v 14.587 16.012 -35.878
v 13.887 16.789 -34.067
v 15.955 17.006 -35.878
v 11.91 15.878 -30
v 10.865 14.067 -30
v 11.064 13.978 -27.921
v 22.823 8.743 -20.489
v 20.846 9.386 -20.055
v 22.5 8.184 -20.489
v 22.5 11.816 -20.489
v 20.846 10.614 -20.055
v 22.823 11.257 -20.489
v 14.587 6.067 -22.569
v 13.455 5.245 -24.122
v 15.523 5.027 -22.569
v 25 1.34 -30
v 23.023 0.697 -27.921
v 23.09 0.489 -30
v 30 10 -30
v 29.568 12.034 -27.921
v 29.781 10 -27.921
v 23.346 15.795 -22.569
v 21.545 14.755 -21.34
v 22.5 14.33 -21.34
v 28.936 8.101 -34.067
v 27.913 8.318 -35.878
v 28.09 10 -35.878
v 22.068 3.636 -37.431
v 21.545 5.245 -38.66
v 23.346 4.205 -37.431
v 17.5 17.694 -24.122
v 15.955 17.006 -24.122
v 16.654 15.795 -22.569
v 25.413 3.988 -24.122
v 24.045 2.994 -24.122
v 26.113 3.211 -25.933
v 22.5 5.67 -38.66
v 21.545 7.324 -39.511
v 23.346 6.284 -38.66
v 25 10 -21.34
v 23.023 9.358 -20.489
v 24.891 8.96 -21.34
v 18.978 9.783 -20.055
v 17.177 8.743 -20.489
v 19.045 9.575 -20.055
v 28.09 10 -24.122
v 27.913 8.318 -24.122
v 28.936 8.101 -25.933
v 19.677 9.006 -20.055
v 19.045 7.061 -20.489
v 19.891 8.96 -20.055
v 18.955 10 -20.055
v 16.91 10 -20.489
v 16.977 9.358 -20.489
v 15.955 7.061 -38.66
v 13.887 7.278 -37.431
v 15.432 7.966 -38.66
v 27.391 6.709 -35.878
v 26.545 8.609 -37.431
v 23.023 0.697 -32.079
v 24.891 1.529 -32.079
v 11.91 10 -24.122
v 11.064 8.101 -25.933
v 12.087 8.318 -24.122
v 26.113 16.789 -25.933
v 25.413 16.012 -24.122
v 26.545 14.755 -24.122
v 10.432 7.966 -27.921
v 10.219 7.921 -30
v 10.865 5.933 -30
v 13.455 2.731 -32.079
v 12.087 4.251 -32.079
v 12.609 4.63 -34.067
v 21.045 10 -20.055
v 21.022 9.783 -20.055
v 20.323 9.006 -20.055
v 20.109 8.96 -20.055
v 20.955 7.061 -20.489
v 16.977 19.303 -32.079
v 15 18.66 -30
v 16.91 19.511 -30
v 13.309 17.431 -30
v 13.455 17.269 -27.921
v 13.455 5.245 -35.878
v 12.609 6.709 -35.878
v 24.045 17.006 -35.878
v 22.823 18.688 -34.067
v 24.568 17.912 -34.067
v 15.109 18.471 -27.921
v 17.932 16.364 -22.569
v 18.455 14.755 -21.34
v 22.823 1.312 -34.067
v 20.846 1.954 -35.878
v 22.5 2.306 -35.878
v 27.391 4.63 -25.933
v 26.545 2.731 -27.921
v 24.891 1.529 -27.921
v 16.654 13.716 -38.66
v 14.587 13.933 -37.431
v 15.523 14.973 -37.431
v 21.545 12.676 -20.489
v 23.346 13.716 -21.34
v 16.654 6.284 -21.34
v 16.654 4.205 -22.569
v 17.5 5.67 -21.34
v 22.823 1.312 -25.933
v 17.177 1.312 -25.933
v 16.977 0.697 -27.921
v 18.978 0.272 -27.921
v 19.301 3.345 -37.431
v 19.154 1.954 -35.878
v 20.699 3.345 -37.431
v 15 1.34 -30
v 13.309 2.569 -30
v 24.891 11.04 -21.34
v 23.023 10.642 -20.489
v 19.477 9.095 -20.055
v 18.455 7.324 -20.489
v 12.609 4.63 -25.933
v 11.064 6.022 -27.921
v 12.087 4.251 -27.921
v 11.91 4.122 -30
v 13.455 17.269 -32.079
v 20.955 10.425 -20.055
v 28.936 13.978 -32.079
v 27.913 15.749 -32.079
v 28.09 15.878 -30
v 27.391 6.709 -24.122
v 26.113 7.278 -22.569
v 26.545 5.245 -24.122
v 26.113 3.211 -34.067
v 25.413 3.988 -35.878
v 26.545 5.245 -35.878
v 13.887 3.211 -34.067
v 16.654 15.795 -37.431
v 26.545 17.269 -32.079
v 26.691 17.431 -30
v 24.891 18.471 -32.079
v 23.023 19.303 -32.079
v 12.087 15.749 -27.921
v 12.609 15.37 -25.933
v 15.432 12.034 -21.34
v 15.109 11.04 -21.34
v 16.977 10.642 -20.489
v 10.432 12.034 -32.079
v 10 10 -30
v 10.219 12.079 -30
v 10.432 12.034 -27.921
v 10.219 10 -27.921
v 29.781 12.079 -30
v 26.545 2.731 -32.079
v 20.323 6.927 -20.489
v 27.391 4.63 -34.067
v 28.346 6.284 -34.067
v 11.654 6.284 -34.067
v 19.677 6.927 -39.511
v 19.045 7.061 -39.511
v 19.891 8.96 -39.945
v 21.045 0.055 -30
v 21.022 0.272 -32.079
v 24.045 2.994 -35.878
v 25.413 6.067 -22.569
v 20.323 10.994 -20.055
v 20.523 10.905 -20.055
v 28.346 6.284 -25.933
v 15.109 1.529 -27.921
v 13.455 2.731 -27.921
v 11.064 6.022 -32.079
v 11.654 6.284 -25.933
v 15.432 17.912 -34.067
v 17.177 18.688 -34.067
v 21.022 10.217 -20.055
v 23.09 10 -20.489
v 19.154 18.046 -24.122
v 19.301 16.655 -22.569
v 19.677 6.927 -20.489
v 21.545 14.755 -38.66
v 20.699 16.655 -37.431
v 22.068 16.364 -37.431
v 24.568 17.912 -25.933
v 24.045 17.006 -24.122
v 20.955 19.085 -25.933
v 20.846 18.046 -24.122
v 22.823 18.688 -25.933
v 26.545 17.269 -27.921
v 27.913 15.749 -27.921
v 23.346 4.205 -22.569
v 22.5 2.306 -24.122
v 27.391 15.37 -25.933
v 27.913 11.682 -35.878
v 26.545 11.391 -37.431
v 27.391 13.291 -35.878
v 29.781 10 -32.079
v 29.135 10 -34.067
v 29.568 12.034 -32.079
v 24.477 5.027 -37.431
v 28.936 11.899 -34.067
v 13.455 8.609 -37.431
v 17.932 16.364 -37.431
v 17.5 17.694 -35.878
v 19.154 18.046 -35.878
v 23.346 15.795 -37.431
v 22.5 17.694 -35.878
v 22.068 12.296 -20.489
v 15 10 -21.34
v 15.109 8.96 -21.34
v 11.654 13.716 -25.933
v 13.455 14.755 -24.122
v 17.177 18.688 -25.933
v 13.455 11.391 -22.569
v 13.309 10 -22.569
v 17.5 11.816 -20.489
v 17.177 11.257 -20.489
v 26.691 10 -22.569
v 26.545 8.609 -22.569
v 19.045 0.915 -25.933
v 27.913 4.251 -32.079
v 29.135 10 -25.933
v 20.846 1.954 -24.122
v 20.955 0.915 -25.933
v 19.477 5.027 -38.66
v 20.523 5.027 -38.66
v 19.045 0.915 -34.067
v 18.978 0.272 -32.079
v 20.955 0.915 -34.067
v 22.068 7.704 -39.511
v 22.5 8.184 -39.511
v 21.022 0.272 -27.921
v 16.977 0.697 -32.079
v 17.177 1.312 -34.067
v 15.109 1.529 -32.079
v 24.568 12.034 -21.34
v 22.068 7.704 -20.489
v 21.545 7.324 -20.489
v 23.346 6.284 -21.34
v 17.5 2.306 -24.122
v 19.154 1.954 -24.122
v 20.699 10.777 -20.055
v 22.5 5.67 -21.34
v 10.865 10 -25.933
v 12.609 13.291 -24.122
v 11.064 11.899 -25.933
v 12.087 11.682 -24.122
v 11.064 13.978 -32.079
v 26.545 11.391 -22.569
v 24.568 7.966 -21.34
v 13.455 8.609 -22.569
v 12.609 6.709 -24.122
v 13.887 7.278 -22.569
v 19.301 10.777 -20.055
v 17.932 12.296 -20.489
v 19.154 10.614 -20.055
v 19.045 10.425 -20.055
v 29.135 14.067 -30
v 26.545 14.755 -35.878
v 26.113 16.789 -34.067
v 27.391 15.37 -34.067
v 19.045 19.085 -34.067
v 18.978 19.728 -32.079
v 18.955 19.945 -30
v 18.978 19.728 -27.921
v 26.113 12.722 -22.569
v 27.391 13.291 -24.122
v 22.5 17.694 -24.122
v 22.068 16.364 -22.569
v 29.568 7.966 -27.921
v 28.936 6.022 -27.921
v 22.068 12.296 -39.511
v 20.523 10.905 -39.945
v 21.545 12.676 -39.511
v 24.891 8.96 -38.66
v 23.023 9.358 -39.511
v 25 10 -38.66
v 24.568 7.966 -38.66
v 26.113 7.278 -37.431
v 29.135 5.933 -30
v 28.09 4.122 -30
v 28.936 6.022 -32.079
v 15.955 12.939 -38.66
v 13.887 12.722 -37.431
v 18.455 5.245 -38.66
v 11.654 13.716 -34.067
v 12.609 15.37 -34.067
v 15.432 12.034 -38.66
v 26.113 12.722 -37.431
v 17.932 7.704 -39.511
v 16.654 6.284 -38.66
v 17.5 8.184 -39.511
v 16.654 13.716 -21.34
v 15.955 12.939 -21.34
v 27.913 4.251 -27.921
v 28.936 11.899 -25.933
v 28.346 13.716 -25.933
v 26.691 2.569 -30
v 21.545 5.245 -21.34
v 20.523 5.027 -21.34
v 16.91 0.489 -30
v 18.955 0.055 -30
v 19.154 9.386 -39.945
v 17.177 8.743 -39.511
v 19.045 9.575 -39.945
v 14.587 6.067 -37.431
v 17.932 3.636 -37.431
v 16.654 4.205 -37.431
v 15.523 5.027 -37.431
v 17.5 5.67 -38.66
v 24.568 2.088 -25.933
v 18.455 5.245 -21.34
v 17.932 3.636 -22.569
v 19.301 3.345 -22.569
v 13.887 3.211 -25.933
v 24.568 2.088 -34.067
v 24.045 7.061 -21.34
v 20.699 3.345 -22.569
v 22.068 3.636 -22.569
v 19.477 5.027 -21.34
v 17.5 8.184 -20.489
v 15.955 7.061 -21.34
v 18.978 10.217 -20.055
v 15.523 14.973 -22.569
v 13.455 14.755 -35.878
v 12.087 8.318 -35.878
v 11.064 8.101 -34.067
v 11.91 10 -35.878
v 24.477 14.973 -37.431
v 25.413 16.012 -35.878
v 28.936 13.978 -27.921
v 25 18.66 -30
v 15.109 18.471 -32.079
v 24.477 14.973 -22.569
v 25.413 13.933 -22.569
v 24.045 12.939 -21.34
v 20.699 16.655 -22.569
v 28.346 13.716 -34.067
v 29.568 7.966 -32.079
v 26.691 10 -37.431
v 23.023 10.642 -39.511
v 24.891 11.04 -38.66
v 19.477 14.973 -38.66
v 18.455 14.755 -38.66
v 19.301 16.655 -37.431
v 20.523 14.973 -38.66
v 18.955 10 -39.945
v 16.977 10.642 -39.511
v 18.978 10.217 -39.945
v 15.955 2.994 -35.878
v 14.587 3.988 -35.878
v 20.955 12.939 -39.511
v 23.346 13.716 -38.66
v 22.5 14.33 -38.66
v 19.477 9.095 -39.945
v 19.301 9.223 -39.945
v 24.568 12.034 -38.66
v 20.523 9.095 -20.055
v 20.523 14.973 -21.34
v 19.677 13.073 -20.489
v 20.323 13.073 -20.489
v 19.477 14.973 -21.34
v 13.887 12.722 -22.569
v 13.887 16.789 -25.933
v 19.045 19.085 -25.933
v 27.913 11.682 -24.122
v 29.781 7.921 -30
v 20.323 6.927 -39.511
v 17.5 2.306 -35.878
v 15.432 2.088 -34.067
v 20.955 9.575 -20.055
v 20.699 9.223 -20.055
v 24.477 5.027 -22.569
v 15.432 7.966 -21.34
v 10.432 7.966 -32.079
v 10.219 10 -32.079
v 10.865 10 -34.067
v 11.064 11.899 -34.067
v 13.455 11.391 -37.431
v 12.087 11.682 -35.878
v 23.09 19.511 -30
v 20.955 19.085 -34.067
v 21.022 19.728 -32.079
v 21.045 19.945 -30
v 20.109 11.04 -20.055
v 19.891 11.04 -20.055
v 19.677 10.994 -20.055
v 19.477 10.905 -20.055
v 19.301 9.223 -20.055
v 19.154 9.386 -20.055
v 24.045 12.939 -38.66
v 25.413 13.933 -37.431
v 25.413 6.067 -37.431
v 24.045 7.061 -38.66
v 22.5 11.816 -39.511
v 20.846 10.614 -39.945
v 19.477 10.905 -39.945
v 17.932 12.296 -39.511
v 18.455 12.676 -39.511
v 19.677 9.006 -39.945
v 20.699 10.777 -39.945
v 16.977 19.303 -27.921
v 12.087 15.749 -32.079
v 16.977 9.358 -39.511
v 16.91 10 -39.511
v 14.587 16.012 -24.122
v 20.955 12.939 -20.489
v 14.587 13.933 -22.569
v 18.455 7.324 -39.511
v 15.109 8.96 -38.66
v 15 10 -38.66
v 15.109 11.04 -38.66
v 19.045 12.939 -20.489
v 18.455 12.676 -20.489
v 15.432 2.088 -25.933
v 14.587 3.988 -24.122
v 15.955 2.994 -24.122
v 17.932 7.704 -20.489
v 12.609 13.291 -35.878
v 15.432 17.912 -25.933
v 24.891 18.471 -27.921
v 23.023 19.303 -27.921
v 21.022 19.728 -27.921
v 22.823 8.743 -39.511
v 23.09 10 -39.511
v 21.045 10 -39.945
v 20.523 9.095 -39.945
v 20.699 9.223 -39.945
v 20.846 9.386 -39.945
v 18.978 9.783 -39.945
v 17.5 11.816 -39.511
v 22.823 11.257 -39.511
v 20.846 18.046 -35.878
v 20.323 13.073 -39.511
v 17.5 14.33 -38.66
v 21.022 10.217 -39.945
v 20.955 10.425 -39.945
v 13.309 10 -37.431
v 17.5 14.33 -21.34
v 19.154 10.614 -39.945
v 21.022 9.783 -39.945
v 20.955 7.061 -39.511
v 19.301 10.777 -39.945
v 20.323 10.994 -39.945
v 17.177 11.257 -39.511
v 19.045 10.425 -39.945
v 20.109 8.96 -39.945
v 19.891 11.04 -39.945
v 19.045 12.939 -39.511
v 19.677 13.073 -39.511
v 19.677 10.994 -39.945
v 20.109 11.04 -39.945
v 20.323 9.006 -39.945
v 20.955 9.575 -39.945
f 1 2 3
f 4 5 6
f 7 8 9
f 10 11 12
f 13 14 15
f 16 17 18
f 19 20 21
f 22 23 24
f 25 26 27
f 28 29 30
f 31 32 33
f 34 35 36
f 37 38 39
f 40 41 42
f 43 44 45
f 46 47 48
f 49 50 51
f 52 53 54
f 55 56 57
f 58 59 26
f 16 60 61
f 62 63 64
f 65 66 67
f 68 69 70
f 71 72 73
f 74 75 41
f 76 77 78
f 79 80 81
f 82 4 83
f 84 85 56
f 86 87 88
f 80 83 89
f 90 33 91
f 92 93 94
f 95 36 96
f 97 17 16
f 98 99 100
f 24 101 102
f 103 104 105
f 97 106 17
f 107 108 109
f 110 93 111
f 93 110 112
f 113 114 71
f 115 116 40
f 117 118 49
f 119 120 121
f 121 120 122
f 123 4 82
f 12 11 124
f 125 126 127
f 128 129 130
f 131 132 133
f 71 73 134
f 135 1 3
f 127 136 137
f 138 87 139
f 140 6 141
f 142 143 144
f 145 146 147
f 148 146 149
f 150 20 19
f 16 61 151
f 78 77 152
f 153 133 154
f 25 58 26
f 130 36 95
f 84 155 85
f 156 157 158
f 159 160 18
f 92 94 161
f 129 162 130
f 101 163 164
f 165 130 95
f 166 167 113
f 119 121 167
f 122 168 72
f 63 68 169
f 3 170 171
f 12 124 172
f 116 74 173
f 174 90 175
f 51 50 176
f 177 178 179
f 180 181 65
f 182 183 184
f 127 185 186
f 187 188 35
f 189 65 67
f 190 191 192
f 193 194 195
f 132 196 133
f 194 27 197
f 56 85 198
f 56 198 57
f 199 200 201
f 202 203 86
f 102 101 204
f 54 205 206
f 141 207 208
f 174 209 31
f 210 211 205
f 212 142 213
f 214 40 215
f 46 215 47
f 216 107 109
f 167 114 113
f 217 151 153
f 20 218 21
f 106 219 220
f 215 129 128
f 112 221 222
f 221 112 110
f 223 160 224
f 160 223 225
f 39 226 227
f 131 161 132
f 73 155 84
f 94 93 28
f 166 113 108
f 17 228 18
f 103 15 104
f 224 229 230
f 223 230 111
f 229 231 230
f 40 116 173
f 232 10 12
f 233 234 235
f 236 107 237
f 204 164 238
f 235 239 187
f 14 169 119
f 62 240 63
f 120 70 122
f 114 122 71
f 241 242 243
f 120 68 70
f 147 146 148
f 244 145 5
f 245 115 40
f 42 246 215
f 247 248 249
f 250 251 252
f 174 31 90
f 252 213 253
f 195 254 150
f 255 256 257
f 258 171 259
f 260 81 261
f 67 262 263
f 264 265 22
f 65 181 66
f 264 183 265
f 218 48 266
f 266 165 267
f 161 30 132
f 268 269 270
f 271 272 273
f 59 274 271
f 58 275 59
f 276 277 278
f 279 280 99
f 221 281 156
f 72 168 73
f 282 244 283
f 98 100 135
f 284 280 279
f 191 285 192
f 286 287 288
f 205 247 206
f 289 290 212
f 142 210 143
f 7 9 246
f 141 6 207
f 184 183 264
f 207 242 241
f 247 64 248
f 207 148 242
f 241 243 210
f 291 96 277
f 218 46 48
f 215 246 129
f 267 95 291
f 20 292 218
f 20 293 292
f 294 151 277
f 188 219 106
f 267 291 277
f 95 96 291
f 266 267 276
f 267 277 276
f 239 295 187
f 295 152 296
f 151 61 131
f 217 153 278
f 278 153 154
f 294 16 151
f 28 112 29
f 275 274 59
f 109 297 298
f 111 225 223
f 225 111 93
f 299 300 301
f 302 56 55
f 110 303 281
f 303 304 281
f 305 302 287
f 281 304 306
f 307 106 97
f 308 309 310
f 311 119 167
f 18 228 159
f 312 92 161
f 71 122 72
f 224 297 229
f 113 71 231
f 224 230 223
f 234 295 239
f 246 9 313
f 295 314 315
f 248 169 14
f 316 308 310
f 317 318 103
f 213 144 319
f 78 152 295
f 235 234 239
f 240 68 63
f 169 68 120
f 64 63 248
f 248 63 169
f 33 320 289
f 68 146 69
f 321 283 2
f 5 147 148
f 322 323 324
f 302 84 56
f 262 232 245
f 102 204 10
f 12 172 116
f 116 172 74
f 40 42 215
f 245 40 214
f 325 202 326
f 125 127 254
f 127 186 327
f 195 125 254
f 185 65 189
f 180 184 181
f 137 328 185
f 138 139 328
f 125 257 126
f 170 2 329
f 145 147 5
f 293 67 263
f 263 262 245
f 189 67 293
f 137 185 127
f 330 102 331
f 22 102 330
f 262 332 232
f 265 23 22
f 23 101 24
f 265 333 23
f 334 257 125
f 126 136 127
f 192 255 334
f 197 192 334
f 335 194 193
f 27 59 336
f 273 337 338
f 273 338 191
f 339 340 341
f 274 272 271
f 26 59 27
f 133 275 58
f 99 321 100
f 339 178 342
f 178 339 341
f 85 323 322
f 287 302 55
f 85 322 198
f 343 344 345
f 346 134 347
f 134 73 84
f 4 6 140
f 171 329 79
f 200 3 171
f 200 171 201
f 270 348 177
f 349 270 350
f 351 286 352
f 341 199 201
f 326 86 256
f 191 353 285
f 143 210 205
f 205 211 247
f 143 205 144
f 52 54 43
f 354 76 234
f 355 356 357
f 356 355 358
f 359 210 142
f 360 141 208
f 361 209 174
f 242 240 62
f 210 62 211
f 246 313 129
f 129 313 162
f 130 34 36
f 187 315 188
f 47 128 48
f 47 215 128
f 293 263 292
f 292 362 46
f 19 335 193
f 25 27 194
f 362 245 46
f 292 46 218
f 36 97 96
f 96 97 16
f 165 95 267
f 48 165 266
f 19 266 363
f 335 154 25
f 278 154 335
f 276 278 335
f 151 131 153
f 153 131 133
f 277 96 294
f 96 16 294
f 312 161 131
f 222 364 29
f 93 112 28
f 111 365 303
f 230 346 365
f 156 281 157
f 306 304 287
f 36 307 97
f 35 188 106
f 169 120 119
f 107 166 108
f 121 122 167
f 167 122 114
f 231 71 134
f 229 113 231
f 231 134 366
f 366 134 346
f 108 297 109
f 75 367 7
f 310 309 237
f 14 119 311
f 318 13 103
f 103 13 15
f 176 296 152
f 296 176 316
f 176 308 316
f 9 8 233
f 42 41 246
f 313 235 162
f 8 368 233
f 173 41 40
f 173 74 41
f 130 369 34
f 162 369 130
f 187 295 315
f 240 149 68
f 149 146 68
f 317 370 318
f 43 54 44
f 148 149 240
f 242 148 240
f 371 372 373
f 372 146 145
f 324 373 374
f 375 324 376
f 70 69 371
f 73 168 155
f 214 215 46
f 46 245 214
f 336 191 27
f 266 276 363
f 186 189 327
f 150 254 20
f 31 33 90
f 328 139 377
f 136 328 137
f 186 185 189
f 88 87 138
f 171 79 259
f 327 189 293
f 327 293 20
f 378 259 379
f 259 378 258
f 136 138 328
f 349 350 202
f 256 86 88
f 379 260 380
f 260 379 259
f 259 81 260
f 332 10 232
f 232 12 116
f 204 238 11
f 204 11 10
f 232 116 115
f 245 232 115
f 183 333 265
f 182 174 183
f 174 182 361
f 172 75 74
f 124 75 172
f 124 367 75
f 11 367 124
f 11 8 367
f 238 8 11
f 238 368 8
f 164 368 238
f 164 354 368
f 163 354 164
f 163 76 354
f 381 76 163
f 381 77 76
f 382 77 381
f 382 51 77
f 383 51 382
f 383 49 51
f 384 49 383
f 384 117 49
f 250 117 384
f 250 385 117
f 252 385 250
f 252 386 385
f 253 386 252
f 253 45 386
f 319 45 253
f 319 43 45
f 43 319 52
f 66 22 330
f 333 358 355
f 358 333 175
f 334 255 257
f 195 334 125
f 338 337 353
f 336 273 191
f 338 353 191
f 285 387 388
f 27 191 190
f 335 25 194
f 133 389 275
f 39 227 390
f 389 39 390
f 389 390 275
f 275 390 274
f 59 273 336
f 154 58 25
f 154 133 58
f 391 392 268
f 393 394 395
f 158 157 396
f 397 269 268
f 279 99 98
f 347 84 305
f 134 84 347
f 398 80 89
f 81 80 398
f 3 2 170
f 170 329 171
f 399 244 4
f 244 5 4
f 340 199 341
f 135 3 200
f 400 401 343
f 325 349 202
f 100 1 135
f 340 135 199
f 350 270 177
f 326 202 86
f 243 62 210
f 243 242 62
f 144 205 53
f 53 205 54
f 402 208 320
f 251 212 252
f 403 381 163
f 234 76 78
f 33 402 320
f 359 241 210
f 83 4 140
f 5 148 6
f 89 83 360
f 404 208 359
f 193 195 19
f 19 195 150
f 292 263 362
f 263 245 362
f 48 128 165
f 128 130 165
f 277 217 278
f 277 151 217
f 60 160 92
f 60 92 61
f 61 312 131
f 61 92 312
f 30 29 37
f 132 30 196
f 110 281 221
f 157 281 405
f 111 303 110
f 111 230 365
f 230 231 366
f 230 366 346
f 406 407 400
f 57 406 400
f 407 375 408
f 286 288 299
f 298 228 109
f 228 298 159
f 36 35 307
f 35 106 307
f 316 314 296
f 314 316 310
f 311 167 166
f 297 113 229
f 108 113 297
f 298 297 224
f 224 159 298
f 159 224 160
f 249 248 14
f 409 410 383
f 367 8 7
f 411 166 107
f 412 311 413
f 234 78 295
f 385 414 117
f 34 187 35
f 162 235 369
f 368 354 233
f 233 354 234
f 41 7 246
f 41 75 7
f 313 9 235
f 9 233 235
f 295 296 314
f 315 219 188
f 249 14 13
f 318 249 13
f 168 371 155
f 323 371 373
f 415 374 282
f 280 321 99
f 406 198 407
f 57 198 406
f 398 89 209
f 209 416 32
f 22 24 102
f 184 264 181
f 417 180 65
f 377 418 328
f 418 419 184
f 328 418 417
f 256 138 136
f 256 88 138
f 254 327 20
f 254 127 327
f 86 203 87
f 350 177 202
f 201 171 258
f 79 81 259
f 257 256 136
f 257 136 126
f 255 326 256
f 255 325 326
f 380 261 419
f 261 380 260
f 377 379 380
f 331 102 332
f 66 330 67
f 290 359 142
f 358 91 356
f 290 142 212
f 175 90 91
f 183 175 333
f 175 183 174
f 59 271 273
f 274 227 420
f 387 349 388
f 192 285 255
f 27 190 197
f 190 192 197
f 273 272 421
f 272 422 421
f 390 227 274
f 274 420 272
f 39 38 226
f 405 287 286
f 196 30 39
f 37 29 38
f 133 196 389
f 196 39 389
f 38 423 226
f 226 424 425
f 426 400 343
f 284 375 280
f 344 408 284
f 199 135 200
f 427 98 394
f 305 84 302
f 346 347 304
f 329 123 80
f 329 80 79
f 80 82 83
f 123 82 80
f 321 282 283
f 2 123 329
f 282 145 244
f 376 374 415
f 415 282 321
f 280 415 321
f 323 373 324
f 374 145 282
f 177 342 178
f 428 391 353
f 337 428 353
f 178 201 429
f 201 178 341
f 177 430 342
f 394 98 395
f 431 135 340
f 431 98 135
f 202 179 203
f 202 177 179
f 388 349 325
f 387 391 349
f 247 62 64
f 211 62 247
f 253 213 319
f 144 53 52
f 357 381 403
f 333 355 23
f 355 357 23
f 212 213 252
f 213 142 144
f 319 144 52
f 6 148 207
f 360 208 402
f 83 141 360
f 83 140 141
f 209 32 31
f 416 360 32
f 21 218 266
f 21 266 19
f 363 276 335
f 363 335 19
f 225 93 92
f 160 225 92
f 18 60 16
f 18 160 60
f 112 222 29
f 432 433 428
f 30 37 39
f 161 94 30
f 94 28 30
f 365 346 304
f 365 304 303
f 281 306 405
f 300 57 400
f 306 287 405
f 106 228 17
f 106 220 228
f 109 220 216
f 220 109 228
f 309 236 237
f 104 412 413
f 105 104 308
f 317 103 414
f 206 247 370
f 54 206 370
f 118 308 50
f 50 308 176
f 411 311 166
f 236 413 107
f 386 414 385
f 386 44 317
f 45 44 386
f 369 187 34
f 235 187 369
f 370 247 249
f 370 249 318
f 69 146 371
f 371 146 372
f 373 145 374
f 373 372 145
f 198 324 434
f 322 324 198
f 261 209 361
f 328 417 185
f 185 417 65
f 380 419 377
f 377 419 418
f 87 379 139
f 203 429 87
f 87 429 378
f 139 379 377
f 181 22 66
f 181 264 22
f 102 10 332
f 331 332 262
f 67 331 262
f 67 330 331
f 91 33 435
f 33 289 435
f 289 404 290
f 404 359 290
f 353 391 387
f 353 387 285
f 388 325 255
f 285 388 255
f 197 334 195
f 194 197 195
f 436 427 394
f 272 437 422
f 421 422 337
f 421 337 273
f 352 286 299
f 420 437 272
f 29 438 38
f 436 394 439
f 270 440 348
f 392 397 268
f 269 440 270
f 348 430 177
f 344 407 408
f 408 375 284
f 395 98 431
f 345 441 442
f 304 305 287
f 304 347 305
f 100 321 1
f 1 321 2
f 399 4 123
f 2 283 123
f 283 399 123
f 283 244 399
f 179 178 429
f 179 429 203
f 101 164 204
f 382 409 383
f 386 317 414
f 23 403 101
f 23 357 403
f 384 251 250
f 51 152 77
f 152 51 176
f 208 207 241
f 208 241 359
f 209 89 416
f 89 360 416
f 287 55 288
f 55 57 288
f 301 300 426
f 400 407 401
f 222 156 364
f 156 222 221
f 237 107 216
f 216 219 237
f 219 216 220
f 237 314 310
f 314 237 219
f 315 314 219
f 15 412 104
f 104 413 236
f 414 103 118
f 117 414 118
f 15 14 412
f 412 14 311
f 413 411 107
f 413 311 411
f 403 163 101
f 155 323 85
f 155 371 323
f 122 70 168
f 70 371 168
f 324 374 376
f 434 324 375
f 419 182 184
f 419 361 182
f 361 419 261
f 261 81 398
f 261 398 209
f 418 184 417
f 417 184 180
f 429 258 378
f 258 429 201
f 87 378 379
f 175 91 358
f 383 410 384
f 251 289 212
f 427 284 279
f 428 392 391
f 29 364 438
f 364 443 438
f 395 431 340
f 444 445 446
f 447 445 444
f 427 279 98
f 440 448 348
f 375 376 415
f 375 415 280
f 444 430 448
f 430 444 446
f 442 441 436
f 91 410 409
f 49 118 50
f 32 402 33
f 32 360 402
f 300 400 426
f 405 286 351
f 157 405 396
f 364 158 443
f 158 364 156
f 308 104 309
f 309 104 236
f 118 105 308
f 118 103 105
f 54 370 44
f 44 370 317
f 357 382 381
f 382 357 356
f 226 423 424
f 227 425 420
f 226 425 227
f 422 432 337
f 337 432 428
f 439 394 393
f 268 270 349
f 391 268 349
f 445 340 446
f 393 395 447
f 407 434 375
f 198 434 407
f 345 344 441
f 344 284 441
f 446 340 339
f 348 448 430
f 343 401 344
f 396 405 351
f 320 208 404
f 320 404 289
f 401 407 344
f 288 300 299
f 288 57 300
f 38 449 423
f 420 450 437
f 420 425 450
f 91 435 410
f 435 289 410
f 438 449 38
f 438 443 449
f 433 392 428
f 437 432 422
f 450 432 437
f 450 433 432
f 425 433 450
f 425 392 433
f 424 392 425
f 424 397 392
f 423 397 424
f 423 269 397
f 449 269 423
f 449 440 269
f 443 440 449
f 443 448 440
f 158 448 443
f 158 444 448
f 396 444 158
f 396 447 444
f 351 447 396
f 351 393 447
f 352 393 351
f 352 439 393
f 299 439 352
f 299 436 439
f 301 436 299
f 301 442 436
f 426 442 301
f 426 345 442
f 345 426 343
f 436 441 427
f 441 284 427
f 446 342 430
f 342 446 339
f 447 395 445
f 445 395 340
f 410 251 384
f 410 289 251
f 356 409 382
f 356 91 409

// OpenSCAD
// Generated by generate_scads.py
translate([20,10,-30]) {
  intersection() {
    sphere(r=12);
    sphere(r=10);
  }
}
